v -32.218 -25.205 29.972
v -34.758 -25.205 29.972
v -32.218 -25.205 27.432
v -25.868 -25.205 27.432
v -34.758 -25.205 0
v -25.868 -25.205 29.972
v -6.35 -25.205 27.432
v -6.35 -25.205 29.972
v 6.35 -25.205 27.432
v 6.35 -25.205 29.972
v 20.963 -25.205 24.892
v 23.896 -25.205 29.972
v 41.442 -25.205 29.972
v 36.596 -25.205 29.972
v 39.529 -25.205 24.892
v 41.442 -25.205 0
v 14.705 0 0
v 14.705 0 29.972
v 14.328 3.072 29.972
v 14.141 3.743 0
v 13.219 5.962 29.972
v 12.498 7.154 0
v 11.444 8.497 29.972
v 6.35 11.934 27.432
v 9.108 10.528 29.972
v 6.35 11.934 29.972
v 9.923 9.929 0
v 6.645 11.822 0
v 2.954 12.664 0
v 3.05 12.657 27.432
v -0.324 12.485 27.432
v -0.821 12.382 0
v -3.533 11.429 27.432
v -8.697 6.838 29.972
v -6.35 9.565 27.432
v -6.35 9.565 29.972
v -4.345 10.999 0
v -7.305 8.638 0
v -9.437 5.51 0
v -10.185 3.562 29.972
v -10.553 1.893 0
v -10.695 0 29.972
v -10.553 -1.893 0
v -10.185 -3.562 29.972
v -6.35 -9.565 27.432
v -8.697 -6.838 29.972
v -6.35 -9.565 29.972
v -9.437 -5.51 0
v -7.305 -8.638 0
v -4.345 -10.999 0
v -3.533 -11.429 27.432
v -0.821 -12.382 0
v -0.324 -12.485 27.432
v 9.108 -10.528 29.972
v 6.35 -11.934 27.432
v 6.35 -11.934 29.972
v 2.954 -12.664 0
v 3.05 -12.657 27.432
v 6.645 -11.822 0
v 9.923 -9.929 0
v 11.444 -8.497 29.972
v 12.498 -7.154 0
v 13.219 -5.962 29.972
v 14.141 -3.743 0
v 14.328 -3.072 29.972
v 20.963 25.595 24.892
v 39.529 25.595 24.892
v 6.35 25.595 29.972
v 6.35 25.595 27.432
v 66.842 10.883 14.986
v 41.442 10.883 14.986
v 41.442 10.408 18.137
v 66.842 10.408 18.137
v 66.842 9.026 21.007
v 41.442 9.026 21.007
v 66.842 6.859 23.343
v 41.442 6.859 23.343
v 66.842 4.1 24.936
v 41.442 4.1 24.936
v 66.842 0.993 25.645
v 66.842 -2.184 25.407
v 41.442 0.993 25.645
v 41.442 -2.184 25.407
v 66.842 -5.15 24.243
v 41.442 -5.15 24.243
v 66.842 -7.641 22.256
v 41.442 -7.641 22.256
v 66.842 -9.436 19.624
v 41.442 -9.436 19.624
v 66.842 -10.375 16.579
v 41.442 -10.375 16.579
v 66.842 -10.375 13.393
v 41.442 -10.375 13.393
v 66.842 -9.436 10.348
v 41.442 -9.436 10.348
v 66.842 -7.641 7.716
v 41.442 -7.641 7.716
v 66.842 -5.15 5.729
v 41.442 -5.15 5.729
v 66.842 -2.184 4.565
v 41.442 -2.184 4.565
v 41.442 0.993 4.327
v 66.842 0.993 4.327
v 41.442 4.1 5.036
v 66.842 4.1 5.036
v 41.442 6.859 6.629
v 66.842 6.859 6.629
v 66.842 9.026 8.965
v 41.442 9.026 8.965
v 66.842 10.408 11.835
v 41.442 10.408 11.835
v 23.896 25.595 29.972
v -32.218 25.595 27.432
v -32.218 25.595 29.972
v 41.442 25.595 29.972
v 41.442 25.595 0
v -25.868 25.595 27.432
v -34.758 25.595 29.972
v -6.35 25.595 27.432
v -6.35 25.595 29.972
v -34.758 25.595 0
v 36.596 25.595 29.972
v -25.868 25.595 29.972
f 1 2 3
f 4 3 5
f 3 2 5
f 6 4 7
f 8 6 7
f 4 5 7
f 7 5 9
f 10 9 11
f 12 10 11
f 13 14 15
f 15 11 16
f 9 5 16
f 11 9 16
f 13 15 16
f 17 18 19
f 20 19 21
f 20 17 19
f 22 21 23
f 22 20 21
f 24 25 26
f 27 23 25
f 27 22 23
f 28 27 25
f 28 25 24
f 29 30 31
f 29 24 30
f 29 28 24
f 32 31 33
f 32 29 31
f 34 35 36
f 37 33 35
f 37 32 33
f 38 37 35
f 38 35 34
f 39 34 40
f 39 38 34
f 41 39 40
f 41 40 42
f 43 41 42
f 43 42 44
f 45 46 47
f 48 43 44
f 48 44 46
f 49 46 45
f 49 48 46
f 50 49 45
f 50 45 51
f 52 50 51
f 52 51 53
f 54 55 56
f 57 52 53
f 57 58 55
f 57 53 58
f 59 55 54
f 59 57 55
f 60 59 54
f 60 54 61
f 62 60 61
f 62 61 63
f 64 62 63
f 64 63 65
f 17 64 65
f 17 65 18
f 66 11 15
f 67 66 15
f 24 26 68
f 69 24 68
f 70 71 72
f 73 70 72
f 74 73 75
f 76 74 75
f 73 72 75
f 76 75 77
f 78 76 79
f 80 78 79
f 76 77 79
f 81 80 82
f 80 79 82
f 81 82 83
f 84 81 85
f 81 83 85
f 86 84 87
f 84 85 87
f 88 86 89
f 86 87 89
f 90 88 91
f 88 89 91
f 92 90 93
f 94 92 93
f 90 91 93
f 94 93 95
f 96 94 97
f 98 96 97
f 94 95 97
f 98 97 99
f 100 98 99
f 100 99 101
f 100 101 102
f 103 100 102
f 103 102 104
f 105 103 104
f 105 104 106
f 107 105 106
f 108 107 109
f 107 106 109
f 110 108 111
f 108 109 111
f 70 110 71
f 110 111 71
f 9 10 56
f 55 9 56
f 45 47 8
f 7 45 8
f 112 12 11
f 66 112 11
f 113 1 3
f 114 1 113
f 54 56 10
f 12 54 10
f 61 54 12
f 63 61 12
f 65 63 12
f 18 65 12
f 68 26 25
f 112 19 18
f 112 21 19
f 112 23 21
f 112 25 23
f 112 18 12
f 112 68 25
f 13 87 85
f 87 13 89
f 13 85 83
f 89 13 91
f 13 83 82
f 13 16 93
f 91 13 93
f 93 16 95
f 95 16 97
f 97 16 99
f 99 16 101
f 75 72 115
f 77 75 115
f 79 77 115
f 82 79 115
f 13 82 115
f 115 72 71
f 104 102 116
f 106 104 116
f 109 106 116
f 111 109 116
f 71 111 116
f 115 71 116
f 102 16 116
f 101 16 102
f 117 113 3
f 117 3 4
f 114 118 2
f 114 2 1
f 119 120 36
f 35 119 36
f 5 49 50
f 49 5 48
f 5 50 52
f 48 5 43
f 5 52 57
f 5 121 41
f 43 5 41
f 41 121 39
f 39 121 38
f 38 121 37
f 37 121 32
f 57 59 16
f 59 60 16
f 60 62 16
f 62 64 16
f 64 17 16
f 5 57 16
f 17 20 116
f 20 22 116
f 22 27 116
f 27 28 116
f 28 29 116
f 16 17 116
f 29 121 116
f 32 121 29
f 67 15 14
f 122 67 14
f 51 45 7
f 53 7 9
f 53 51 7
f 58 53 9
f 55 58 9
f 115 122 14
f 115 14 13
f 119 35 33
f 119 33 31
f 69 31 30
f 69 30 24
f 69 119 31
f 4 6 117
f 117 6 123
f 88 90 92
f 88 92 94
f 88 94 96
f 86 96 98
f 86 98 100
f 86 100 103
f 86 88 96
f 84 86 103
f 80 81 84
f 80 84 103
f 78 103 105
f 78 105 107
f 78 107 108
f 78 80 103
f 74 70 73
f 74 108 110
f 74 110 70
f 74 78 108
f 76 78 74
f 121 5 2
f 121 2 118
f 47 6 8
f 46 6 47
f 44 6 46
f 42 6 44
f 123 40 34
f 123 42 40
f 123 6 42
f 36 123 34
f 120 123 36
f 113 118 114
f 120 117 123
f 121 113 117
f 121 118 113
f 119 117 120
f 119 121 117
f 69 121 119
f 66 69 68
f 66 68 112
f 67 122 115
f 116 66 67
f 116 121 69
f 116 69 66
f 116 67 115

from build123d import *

# Parameters (mm, degrees)
F0_W     = 76.2
F0_H     = 50.8
F0_R     = 12.7
F1_DEPTH = 29.972
F2_W     = 6.35
F2_H     = 50.8
F3_DEPTH = 2.54
F5_R     = 10.6886157163
F6_DEPTH = 25.4
F7_DEPTH = 50.801


with BuildPart() as f1:
    # F0 (on Top) → F1 (new body)
    with BuildSketch(Plane.XY):
        with Locations((3.3417083323, 0.1945786622)):
            Rectangle(F0_W, F0_H)
        with Locations((2.0050231833, 0)):
            Circle(F0_R, mode=Mode.SUBTRACT)
    extrude(amount=F1_DEPTH)

    # F2 (on face) → F3 (cut)
    with BuildSketch(Plane.XY.offset(29.972)):
        with Locations((-29.0432916677, 0.1945786622)):
            Rectangle(F2_W, F2_H)
        with BuildLine():
            Line((6.35, 25.5945786622), (-6.35, 25.5945786622))
            Line((-6.35, 25.5945786622), (-6.35, 9.5647053068))
            ThreePointArc((-6.35, 9.5647053068), (-0.3237214829, 12.484668529), (6.35, 11.9336153978))
            Line((6.35, 11.9336153978), (6.35, 25.5945786622))
        make_face()
        with BuildLine():
            Line((-6.35, -9.5647053068), (-6.35, -25.2054213378))
            Line((-6.35, -25.2054213378), (6.35, -25.2054213378))
            Line((6.35, -25.2054213378), (6.35, -11.9336153978))
            ThreePointArc((6.35, -11.9336153978), (-0.3237214829, -12.484668529), (-6.35, -9.5647053068))
        make_face()
    extrude(amount=-F3_DEPTH, mode=Mode.SUBTRACT)

    # F5 (on face) → F6 (join)
    with BuildSketch(Plane.YZ.offset(41.4417083323)):
        with Locations((0.1945786622, 14.986)):
            Circle(F5_R)
    extrude(amount=F6_DEPTH)

    # F4 (on face) → F7 (cut, through all)
    with BuildSketch(Plane.XZ.offset(25.2054213378)):
        Polygon((36.5958541662, 29.972), (23.8958541662, 29.972), (20.9629147987, 24.892), (39.5287935336, 24.892), align=None)
    extrude(amount=-F7_DEPTH, mode=Mode.SUBTRACT)


solid = f1.part
